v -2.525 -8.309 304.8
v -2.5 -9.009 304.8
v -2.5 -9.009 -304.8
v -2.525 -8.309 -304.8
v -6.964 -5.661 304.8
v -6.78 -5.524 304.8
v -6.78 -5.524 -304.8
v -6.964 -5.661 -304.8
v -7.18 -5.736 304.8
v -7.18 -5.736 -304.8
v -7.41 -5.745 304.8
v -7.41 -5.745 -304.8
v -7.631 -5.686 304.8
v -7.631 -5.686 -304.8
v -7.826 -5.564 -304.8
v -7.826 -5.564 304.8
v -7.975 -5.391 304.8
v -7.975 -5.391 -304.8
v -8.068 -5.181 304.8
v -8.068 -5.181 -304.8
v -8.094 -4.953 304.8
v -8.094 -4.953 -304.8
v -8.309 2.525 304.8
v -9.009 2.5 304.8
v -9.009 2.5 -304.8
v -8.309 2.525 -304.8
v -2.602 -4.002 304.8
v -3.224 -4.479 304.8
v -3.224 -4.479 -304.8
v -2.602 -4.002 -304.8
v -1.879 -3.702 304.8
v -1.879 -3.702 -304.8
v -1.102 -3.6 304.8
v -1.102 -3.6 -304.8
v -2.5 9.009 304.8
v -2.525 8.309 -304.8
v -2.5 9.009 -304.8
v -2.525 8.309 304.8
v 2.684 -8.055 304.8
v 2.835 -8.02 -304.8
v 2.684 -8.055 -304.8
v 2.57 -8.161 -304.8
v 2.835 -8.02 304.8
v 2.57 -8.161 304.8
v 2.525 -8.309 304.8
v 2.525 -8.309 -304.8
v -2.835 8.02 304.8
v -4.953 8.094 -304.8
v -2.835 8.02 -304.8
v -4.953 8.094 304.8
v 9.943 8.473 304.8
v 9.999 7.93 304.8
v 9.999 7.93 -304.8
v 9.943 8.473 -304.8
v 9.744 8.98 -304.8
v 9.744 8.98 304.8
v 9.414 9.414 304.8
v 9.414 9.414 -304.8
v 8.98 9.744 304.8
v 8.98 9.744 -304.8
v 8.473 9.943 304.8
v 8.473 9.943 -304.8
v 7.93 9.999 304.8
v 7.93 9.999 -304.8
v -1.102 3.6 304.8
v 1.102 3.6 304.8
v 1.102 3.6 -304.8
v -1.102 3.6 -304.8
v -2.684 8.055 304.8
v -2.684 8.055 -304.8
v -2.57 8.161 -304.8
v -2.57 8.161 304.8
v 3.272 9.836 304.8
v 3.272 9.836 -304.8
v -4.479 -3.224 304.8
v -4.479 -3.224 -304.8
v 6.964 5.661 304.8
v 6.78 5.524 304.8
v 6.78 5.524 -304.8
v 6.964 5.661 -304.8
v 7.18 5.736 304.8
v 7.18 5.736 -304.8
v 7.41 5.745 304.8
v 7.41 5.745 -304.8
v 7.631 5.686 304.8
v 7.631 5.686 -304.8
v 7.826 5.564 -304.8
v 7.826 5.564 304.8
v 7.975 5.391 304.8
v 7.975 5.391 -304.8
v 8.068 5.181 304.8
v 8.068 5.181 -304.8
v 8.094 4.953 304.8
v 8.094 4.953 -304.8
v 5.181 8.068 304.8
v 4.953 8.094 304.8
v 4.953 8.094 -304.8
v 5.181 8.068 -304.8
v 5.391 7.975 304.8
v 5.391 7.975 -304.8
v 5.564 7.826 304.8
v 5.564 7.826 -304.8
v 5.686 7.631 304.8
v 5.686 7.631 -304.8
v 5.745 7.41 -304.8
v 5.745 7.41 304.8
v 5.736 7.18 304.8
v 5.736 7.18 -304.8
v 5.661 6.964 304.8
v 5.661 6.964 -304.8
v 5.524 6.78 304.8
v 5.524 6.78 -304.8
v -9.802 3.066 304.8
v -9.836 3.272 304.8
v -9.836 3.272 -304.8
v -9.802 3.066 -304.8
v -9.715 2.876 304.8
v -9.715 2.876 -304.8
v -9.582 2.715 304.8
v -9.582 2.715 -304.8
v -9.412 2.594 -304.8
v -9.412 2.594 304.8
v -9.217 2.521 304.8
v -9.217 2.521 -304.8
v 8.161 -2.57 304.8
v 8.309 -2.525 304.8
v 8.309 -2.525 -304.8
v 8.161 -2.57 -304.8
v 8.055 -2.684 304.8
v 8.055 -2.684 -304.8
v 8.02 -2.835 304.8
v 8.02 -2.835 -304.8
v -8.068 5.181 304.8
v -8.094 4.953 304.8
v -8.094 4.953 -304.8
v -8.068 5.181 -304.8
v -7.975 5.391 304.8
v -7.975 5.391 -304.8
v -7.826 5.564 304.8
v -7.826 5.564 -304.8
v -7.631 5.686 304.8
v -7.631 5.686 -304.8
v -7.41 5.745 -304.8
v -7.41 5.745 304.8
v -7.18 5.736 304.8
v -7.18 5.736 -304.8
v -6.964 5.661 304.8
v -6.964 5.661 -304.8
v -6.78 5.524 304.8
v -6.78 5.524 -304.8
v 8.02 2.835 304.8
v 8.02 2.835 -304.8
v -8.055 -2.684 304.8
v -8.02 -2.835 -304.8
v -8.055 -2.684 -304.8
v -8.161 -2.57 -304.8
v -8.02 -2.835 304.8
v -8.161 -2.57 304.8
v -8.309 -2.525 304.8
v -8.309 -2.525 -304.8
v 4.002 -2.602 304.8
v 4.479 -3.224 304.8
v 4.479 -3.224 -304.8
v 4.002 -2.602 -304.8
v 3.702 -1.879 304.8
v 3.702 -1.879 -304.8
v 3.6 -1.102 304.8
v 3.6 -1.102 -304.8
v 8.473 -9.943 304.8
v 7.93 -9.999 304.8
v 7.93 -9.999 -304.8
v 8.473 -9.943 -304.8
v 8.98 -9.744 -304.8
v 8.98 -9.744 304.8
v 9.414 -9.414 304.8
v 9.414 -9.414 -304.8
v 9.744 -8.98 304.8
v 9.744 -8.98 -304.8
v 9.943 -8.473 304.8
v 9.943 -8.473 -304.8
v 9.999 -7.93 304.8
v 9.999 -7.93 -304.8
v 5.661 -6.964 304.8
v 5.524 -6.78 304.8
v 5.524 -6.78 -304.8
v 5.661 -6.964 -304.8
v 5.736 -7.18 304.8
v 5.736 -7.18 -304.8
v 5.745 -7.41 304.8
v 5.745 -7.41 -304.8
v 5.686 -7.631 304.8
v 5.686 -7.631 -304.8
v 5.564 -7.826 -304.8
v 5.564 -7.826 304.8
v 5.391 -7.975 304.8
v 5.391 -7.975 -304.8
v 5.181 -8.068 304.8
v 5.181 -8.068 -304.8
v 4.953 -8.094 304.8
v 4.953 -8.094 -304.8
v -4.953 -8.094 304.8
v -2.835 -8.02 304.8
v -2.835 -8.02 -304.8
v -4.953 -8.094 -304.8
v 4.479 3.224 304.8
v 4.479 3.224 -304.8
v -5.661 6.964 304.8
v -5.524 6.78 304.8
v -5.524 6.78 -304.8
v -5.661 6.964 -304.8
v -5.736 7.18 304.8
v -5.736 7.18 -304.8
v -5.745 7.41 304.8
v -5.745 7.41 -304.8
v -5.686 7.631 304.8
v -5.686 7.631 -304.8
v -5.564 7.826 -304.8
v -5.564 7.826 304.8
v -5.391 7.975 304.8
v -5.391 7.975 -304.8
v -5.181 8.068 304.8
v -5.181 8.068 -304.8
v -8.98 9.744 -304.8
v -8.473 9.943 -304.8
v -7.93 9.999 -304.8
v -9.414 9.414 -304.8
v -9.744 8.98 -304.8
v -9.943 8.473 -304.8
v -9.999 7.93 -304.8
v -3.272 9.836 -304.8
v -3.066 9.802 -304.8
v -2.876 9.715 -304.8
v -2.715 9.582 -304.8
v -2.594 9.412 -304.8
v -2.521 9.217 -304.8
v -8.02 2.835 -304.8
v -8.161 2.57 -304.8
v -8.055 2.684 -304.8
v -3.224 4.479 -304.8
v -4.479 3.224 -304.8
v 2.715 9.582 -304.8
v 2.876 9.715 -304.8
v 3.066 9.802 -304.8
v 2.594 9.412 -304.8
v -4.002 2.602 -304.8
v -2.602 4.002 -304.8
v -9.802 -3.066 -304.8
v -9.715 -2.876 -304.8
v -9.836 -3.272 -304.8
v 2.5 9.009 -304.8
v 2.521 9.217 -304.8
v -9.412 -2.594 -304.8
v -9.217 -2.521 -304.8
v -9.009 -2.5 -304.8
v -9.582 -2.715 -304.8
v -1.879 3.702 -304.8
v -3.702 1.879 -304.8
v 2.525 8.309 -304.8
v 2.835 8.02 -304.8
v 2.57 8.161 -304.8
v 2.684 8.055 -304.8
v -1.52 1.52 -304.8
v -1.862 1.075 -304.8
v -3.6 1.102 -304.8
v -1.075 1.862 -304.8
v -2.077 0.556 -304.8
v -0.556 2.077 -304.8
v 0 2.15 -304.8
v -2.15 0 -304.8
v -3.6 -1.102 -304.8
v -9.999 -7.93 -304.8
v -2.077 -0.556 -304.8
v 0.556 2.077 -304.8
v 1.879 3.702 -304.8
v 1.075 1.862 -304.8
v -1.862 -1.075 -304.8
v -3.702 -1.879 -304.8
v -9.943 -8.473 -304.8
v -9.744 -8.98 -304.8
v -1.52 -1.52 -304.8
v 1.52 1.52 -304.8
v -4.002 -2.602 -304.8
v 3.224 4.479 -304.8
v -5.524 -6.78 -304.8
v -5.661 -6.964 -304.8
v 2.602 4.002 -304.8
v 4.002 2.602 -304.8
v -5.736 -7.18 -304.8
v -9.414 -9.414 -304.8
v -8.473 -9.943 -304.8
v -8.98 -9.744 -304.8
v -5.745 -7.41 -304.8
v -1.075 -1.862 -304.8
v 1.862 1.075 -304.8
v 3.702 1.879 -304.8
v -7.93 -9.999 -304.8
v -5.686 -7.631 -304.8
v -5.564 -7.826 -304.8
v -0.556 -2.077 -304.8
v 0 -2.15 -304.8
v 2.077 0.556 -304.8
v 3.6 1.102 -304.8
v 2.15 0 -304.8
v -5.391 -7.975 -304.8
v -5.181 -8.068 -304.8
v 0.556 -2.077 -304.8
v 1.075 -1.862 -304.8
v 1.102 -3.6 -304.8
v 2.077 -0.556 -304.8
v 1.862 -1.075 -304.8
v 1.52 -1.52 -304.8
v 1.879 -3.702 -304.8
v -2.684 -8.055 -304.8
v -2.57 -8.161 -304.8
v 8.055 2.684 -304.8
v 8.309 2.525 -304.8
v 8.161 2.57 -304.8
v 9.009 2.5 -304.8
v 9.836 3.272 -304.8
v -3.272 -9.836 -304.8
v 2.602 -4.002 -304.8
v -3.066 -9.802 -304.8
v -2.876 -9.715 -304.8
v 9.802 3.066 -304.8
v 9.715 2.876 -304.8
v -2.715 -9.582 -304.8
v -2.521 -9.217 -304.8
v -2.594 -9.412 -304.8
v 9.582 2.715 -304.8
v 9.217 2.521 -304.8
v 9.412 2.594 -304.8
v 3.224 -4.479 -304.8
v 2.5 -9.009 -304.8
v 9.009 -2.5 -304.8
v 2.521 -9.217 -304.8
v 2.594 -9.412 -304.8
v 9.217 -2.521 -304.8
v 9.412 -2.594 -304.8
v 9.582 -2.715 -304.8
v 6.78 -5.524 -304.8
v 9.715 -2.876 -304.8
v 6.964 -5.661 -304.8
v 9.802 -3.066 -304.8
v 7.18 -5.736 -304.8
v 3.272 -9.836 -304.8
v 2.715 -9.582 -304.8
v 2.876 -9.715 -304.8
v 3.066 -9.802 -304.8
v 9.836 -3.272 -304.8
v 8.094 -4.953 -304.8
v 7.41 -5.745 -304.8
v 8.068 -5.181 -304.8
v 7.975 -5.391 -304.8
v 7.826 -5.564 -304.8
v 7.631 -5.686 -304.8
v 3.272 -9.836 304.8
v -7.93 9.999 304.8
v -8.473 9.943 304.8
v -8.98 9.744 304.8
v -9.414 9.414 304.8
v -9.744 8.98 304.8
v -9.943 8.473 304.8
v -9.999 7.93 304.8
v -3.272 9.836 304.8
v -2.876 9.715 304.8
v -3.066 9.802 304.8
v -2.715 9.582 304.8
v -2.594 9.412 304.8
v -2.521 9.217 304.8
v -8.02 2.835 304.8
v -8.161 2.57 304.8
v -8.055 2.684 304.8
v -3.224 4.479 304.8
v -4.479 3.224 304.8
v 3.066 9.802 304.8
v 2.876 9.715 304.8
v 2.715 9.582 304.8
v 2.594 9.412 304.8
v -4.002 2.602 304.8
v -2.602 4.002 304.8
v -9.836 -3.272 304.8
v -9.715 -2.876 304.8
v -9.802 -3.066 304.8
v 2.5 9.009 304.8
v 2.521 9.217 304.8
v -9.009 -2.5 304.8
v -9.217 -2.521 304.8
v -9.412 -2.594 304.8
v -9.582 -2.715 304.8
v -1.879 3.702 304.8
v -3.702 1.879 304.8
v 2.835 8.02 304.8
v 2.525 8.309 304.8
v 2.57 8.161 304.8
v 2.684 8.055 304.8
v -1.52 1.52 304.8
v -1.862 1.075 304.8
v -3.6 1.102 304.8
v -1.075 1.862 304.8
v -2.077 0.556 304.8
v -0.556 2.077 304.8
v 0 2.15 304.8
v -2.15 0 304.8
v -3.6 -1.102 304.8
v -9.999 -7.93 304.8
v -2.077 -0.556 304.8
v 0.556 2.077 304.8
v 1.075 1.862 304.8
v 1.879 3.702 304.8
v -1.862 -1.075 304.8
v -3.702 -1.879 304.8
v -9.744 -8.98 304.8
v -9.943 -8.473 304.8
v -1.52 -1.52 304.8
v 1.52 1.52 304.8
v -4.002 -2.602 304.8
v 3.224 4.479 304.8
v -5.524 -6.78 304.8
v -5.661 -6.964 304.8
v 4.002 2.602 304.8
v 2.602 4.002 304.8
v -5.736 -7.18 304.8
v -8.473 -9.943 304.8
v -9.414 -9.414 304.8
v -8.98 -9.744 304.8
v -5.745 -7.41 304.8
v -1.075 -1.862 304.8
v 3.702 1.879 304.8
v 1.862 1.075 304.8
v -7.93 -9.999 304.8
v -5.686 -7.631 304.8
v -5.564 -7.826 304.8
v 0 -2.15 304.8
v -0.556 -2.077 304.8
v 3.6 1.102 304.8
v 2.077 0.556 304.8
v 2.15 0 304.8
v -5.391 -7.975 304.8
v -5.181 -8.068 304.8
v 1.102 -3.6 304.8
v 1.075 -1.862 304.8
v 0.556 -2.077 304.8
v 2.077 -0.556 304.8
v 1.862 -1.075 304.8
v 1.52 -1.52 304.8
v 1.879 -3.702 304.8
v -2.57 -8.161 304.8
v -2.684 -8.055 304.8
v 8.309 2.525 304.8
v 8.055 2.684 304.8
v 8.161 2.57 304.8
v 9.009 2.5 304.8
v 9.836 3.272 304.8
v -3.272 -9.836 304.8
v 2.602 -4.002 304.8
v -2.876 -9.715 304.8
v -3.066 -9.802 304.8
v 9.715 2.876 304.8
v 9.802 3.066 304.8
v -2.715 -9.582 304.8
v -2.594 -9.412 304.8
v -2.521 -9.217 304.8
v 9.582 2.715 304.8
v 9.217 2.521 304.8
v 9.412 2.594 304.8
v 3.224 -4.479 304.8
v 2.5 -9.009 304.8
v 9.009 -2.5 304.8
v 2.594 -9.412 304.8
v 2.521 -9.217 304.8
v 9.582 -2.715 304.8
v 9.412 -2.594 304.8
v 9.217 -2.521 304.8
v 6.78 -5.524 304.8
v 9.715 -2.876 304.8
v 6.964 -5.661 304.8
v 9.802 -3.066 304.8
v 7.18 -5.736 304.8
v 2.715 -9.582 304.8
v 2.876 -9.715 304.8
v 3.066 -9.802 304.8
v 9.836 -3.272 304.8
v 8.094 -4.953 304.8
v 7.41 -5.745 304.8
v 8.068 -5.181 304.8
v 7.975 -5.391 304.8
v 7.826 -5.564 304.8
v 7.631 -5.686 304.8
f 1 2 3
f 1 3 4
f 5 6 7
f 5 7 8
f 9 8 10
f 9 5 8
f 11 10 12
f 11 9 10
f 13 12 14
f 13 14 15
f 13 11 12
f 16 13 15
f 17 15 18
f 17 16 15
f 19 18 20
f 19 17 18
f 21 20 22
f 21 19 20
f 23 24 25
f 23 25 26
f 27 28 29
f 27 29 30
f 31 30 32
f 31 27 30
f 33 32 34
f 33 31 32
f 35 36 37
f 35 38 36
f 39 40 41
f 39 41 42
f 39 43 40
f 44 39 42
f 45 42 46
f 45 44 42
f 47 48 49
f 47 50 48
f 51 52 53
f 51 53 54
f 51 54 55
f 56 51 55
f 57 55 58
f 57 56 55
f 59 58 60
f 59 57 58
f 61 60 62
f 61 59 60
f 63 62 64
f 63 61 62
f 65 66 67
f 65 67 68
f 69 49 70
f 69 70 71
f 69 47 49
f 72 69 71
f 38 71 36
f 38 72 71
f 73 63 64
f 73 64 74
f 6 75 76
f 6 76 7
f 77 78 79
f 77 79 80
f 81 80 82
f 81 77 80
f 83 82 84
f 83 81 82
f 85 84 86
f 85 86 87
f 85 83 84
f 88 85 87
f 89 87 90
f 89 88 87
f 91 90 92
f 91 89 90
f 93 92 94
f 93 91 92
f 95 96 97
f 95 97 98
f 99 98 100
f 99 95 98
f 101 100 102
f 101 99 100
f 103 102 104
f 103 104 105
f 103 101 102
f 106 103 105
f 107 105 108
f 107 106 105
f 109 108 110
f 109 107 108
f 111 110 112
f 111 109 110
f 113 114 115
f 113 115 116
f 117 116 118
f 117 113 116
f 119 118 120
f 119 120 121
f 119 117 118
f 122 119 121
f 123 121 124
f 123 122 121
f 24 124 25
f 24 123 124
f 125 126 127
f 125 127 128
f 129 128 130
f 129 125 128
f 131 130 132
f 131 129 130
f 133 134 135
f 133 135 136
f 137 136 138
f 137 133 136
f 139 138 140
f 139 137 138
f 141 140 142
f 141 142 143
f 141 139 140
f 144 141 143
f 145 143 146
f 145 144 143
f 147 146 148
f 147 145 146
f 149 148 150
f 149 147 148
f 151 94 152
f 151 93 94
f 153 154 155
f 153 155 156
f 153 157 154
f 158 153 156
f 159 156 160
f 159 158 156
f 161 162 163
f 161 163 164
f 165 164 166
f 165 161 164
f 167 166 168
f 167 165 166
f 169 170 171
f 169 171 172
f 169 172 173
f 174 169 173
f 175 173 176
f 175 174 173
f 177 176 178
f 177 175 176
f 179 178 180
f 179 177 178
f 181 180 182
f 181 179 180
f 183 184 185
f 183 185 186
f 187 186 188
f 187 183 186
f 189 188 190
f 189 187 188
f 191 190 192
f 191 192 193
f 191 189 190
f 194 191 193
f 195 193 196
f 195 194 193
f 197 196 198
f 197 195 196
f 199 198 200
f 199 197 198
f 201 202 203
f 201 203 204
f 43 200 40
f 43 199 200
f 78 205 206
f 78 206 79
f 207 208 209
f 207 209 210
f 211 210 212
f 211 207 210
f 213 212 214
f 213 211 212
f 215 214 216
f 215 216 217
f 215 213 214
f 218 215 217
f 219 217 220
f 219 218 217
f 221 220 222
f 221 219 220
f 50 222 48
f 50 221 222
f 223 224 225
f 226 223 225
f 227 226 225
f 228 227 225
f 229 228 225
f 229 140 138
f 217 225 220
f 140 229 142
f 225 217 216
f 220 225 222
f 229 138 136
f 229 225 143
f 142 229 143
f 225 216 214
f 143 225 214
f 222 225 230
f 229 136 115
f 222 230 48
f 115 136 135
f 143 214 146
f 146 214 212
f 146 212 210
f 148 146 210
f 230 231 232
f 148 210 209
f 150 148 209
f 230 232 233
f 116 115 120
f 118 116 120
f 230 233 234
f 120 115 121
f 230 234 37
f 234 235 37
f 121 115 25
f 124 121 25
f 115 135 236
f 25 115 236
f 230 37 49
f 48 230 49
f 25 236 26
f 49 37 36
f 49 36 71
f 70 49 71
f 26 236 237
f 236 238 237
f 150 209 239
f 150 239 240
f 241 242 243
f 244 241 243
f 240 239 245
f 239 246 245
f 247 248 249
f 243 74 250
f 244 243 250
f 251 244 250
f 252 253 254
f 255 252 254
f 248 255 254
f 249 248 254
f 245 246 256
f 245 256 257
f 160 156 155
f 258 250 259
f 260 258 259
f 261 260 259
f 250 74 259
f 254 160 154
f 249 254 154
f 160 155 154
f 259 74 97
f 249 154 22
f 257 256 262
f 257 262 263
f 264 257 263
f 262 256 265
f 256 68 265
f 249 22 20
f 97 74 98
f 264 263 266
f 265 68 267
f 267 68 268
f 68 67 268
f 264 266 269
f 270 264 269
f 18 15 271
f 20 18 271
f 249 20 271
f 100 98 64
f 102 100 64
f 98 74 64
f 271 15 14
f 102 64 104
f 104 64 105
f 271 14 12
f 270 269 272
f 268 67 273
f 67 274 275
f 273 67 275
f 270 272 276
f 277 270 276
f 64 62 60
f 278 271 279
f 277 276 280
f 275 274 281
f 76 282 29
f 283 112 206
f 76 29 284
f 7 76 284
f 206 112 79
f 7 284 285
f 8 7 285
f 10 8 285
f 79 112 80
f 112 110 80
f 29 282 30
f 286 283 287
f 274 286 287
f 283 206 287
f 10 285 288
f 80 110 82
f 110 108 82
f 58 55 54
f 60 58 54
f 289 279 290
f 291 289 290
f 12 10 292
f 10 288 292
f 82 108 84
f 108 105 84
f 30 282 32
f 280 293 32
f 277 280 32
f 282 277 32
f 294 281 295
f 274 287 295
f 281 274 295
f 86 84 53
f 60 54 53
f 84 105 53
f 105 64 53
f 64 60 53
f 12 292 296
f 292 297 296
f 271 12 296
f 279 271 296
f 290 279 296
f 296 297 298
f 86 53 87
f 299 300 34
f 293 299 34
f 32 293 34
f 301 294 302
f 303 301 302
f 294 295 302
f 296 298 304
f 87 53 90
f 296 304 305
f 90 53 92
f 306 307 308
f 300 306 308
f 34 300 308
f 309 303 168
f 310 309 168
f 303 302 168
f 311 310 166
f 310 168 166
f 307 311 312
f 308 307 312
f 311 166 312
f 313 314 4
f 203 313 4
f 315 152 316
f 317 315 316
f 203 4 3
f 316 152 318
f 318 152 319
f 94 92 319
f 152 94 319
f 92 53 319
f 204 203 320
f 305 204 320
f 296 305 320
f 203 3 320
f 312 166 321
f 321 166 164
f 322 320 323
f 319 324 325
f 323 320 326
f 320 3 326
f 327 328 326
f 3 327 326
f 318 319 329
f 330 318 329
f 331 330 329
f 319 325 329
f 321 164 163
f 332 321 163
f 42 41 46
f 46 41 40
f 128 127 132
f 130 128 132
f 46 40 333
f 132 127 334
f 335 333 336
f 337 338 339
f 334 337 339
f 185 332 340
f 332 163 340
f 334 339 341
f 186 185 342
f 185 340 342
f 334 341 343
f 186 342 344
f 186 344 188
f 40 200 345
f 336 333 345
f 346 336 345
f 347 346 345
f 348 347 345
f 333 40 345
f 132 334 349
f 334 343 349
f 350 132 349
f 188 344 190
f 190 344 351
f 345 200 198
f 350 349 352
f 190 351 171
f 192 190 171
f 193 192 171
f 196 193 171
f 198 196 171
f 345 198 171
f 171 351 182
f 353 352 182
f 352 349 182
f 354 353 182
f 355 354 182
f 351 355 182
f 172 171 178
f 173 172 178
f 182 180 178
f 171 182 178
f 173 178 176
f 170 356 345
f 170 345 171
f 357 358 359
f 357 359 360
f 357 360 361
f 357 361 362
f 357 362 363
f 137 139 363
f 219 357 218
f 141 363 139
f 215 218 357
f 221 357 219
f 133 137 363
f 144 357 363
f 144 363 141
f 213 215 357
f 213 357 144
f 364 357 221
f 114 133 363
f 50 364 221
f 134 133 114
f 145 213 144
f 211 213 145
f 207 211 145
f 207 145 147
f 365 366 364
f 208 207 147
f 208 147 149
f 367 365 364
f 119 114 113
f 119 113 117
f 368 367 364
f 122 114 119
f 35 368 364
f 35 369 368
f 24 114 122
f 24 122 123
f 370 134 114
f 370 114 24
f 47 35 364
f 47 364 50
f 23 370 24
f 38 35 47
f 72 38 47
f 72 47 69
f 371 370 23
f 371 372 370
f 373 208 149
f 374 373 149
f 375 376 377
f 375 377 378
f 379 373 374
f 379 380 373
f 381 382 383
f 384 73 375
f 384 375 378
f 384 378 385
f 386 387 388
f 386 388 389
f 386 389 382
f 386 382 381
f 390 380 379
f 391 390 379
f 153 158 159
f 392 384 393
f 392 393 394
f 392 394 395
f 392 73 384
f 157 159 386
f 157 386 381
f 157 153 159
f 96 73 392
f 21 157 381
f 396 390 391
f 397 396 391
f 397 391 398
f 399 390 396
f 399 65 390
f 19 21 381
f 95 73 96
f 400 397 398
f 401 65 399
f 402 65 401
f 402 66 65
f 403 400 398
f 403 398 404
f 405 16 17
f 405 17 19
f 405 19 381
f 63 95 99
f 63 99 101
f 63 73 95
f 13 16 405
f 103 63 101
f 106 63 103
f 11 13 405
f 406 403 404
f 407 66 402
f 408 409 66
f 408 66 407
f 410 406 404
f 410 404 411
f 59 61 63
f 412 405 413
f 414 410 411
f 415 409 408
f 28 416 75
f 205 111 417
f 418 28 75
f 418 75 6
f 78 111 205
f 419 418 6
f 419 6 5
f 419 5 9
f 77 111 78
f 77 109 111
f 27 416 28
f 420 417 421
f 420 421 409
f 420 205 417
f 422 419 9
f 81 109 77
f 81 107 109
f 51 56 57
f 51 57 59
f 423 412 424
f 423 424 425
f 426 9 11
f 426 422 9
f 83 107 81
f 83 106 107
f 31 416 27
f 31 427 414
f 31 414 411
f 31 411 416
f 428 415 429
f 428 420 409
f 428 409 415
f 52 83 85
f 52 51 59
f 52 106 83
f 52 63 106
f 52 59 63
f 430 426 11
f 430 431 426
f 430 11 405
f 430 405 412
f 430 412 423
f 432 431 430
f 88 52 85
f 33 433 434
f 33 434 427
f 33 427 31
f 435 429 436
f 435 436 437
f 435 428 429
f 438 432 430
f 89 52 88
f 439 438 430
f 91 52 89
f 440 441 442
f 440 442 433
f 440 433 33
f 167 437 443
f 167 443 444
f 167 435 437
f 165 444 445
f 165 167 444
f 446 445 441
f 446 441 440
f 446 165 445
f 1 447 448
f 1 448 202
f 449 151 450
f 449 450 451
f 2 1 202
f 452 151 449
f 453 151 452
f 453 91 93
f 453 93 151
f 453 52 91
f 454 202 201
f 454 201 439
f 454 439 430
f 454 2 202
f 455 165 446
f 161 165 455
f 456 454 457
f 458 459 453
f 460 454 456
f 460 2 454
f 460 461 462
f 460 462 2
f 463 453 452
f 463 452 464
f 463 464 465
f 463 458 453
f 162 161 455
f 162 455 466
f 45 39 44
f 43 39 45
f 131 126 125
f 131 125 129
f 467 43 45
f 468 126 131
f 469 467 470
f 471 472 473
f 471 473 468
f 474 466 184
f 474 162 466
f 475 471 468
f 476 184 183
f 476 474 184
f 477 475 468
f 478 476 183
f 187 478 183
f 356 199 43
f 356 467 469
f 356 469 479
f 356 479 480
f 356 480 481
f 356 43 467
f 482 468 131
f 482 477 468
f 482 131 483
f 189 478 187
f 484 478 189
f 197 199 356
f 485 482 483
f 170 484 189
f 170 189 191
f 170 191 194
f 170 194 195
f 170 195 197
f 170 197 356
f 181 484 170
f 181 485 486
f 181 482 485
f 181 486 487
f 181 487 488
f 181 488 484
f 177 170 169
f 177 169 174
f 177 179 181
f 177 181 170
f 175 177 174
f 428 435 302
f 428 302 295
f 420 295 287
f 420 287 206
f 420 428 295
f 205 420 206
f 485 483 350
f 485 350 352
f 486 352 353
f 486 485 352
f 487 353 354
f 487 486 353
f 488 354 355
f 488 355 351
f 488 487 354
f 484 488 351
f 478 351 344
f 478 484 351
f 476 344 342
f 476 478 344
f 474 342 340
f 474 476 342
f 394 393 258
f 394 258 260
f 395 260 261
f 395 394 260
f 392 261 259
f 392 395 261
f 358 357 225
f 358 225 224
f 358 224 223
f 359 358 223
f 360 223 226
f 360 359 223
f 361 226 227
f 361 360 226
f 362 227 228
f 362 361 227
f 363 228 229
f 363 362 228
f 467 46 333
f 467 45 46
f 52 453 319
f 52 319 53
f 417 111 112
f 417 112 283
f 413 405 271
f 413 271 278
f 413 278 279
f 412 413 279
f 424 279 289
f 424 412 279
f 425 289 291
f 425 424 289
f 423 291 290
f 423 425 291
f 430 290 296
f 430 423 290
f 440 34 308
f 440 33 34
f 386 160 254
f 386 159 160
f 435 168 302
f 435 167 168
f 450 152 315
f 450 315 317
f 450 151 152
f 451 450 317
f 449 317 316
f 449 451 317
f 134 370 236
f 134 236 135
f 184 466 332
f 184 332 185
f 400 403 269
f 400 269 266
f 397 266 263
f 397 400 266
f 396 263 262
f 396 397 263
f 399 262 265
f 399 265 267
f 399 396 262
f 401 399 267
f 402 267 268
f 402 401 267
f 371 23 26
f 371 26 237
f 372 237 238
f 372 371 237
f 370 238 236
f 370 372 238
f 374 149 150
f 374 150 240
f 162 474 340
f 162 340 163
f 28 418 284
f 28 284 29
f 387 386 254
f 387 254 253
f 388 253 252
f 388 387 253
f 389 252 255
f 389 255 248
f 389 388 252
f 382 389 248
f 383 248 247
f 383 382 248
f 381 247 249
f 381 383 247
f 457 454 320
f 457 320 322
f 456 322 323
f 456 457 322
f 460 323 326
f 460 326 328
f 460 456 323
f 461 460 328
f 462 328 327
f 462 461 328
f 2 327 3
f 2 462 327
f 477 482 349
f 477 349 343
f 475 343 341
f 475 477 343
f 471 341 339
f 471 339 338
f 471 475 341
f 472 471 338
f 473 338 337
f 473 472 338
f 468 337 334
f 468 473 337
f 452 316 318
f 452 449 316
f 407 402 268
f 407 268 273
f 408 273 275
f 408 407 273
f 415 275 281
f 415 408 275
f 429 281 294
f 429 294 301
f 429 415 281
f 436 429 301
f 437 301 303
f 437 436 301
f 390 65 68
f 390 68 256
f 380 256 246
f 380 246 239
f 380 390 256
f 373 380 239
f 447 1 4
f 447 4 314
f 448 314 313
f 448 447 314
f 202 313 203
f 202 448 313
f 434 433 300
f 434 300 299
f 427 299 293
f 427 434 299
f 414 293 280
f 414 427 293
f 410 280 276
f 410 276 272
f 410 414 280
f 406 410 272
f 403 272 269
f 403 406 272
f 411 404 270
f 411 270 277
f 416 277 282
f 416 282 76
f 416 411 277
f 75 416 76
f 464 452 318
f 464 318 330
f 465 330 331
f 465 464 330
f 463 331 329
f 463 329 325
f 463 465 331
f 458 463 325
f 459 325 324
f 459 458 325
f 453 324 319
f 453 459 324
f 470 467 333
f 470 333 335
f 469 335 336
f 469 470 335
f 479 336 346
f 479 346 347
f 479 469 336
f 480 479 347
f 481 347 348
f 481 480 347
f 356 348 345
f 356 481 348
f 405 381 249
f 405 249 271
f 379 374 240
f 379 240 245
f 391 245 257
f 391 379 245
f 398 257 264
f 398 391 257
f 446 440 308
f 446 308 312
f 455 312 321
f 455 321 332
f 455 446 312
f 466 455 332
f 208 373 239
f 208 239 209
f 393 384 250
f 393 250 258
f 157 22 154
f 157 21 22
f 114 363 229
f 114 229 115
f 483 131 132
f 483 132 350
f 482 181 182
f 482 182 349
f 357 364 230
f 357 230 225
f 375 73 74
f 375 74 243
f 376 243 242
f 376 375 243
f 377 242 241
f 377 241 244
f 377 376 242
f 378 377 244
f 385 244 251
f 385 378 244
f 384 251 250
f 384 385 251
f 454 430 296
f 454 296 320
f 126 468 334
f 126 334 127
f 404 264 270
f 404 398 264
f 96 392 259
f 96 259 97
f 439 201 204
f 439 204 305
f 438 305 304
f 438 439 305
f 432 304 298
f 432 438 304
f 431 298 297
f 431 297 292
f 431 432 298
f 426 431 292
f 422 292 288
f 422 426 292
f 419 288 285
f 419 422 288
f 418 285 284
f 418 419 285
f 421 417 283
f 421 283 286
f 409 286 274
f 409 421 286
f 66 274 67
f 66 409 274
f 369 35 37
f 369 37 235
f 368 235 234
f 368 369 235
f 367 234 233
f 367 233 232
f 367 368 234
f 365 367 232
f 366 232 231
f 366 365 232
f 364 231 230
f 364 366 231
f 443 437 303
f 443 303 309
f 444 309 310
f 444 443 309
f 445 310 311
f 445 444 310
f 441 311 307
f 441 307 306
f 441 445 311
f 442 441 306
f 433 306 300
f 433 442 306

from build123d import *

# Parameters (mm, degrees)
BOSS_EXTRUDE1_DEPTH = 304.8
CIRPATTERN1_COUNT   = 4


with BuildPart() as part:
    # Sketch3 → Boss-Extrude1 (new body, symmetric)
    with BuildSketch(Plane.XY):
        with BuildLine():
            Line((-2.524916986, 8.30911066), (-2.500487338, 9.008684239))
            ThreePointArc((-2.500487338, 9.008684239), (-2.714917039, 9.582202525), (-3.272080403, 9.836116498))
            Line((-3.272080403, 9.836116498), (-7.930201007, 9.998781654))
            ThreePointArc((-7.930201007, 9.998781654), (-9.414213562, 9.414213562), (-9.998781654, 7.930201007))
            Line((-9.998781654, 7.930201007), (-9.836116498, 3.272080403))
            ThreePointArc((-9.836116498, 3.272080403), (-9.582202525, 2.714917039), (-9.008684239, 2.500487338))
            Line((-9.008684239, 2.500487338), (-8.30911066, 2.524916986))
            ThreePointArc((-8.30911066, 2.524916986), (-8.100174399, 2.620134726), (-8.019763261, 2.835204083))
            Line((-8.019763261, 2.835204083), (-8.093719461, 4.953032548))
            ThreePointArc((-8.093719461, 4.953032548), (-7.631170264, 5.686128657), (-6.779559917, 5.52444538))
            Line((-6.779559917, 5.52444538), (-4.478679656, 3.22356512))
            ThreePointArc((-4.478679656, 3.22356512), (-3.828361402, 2.250295073), (-3.6, 1.102244776))
            Line((-3.6, 1.102244776), (-3.6, 0))
            Line((-3.6, 0), (-2.15, 0))
            ThreePointArc((-2.15, 0), (-1.52027958, 1.52027958), (0, 2.15))
            Line((0, 2.15), (0, 3.6))
            Line((0, 3.6), (-1.102244776, 3.6))
            ThreePointArc((-1.102244776, 3.6), (-2.250295073, 3.828361402), (-3.22356512, 4.478679656))
            Line((-3.22356512, 4.478679656), (-5.52444538, 6.779559917))
            ThreePointArc((-5.52444538, 6.779559917), (-5.686128657, 7.631170264), (-4.953032548, 8.093719461))
            Line((-4.953032548, 8.093719461), (-2.835204083, 8.019763261))
            ThreePointArc((-2.835204083, 8.019763261), (-2.620134726, 8.100174399), (-2.524916986, 8.30911066))
        make_face()
    boss_extrude1 = extrude(amount=BOSS_EXTRUDE1_DEPTH, both=True)

    # CirPattern1: Boss-Extrude1 ×4 about axis
    cirpattern1_axis = Axis((0, 0, 0), (0, 0, 1))
    for i in range(1, CIRPATTERN1_COUNT):
        add(boss_extrude1.rotate(cirpattern1_axis, i * 360 / CIRPATTERN1_COUNT))


solid = part.part
